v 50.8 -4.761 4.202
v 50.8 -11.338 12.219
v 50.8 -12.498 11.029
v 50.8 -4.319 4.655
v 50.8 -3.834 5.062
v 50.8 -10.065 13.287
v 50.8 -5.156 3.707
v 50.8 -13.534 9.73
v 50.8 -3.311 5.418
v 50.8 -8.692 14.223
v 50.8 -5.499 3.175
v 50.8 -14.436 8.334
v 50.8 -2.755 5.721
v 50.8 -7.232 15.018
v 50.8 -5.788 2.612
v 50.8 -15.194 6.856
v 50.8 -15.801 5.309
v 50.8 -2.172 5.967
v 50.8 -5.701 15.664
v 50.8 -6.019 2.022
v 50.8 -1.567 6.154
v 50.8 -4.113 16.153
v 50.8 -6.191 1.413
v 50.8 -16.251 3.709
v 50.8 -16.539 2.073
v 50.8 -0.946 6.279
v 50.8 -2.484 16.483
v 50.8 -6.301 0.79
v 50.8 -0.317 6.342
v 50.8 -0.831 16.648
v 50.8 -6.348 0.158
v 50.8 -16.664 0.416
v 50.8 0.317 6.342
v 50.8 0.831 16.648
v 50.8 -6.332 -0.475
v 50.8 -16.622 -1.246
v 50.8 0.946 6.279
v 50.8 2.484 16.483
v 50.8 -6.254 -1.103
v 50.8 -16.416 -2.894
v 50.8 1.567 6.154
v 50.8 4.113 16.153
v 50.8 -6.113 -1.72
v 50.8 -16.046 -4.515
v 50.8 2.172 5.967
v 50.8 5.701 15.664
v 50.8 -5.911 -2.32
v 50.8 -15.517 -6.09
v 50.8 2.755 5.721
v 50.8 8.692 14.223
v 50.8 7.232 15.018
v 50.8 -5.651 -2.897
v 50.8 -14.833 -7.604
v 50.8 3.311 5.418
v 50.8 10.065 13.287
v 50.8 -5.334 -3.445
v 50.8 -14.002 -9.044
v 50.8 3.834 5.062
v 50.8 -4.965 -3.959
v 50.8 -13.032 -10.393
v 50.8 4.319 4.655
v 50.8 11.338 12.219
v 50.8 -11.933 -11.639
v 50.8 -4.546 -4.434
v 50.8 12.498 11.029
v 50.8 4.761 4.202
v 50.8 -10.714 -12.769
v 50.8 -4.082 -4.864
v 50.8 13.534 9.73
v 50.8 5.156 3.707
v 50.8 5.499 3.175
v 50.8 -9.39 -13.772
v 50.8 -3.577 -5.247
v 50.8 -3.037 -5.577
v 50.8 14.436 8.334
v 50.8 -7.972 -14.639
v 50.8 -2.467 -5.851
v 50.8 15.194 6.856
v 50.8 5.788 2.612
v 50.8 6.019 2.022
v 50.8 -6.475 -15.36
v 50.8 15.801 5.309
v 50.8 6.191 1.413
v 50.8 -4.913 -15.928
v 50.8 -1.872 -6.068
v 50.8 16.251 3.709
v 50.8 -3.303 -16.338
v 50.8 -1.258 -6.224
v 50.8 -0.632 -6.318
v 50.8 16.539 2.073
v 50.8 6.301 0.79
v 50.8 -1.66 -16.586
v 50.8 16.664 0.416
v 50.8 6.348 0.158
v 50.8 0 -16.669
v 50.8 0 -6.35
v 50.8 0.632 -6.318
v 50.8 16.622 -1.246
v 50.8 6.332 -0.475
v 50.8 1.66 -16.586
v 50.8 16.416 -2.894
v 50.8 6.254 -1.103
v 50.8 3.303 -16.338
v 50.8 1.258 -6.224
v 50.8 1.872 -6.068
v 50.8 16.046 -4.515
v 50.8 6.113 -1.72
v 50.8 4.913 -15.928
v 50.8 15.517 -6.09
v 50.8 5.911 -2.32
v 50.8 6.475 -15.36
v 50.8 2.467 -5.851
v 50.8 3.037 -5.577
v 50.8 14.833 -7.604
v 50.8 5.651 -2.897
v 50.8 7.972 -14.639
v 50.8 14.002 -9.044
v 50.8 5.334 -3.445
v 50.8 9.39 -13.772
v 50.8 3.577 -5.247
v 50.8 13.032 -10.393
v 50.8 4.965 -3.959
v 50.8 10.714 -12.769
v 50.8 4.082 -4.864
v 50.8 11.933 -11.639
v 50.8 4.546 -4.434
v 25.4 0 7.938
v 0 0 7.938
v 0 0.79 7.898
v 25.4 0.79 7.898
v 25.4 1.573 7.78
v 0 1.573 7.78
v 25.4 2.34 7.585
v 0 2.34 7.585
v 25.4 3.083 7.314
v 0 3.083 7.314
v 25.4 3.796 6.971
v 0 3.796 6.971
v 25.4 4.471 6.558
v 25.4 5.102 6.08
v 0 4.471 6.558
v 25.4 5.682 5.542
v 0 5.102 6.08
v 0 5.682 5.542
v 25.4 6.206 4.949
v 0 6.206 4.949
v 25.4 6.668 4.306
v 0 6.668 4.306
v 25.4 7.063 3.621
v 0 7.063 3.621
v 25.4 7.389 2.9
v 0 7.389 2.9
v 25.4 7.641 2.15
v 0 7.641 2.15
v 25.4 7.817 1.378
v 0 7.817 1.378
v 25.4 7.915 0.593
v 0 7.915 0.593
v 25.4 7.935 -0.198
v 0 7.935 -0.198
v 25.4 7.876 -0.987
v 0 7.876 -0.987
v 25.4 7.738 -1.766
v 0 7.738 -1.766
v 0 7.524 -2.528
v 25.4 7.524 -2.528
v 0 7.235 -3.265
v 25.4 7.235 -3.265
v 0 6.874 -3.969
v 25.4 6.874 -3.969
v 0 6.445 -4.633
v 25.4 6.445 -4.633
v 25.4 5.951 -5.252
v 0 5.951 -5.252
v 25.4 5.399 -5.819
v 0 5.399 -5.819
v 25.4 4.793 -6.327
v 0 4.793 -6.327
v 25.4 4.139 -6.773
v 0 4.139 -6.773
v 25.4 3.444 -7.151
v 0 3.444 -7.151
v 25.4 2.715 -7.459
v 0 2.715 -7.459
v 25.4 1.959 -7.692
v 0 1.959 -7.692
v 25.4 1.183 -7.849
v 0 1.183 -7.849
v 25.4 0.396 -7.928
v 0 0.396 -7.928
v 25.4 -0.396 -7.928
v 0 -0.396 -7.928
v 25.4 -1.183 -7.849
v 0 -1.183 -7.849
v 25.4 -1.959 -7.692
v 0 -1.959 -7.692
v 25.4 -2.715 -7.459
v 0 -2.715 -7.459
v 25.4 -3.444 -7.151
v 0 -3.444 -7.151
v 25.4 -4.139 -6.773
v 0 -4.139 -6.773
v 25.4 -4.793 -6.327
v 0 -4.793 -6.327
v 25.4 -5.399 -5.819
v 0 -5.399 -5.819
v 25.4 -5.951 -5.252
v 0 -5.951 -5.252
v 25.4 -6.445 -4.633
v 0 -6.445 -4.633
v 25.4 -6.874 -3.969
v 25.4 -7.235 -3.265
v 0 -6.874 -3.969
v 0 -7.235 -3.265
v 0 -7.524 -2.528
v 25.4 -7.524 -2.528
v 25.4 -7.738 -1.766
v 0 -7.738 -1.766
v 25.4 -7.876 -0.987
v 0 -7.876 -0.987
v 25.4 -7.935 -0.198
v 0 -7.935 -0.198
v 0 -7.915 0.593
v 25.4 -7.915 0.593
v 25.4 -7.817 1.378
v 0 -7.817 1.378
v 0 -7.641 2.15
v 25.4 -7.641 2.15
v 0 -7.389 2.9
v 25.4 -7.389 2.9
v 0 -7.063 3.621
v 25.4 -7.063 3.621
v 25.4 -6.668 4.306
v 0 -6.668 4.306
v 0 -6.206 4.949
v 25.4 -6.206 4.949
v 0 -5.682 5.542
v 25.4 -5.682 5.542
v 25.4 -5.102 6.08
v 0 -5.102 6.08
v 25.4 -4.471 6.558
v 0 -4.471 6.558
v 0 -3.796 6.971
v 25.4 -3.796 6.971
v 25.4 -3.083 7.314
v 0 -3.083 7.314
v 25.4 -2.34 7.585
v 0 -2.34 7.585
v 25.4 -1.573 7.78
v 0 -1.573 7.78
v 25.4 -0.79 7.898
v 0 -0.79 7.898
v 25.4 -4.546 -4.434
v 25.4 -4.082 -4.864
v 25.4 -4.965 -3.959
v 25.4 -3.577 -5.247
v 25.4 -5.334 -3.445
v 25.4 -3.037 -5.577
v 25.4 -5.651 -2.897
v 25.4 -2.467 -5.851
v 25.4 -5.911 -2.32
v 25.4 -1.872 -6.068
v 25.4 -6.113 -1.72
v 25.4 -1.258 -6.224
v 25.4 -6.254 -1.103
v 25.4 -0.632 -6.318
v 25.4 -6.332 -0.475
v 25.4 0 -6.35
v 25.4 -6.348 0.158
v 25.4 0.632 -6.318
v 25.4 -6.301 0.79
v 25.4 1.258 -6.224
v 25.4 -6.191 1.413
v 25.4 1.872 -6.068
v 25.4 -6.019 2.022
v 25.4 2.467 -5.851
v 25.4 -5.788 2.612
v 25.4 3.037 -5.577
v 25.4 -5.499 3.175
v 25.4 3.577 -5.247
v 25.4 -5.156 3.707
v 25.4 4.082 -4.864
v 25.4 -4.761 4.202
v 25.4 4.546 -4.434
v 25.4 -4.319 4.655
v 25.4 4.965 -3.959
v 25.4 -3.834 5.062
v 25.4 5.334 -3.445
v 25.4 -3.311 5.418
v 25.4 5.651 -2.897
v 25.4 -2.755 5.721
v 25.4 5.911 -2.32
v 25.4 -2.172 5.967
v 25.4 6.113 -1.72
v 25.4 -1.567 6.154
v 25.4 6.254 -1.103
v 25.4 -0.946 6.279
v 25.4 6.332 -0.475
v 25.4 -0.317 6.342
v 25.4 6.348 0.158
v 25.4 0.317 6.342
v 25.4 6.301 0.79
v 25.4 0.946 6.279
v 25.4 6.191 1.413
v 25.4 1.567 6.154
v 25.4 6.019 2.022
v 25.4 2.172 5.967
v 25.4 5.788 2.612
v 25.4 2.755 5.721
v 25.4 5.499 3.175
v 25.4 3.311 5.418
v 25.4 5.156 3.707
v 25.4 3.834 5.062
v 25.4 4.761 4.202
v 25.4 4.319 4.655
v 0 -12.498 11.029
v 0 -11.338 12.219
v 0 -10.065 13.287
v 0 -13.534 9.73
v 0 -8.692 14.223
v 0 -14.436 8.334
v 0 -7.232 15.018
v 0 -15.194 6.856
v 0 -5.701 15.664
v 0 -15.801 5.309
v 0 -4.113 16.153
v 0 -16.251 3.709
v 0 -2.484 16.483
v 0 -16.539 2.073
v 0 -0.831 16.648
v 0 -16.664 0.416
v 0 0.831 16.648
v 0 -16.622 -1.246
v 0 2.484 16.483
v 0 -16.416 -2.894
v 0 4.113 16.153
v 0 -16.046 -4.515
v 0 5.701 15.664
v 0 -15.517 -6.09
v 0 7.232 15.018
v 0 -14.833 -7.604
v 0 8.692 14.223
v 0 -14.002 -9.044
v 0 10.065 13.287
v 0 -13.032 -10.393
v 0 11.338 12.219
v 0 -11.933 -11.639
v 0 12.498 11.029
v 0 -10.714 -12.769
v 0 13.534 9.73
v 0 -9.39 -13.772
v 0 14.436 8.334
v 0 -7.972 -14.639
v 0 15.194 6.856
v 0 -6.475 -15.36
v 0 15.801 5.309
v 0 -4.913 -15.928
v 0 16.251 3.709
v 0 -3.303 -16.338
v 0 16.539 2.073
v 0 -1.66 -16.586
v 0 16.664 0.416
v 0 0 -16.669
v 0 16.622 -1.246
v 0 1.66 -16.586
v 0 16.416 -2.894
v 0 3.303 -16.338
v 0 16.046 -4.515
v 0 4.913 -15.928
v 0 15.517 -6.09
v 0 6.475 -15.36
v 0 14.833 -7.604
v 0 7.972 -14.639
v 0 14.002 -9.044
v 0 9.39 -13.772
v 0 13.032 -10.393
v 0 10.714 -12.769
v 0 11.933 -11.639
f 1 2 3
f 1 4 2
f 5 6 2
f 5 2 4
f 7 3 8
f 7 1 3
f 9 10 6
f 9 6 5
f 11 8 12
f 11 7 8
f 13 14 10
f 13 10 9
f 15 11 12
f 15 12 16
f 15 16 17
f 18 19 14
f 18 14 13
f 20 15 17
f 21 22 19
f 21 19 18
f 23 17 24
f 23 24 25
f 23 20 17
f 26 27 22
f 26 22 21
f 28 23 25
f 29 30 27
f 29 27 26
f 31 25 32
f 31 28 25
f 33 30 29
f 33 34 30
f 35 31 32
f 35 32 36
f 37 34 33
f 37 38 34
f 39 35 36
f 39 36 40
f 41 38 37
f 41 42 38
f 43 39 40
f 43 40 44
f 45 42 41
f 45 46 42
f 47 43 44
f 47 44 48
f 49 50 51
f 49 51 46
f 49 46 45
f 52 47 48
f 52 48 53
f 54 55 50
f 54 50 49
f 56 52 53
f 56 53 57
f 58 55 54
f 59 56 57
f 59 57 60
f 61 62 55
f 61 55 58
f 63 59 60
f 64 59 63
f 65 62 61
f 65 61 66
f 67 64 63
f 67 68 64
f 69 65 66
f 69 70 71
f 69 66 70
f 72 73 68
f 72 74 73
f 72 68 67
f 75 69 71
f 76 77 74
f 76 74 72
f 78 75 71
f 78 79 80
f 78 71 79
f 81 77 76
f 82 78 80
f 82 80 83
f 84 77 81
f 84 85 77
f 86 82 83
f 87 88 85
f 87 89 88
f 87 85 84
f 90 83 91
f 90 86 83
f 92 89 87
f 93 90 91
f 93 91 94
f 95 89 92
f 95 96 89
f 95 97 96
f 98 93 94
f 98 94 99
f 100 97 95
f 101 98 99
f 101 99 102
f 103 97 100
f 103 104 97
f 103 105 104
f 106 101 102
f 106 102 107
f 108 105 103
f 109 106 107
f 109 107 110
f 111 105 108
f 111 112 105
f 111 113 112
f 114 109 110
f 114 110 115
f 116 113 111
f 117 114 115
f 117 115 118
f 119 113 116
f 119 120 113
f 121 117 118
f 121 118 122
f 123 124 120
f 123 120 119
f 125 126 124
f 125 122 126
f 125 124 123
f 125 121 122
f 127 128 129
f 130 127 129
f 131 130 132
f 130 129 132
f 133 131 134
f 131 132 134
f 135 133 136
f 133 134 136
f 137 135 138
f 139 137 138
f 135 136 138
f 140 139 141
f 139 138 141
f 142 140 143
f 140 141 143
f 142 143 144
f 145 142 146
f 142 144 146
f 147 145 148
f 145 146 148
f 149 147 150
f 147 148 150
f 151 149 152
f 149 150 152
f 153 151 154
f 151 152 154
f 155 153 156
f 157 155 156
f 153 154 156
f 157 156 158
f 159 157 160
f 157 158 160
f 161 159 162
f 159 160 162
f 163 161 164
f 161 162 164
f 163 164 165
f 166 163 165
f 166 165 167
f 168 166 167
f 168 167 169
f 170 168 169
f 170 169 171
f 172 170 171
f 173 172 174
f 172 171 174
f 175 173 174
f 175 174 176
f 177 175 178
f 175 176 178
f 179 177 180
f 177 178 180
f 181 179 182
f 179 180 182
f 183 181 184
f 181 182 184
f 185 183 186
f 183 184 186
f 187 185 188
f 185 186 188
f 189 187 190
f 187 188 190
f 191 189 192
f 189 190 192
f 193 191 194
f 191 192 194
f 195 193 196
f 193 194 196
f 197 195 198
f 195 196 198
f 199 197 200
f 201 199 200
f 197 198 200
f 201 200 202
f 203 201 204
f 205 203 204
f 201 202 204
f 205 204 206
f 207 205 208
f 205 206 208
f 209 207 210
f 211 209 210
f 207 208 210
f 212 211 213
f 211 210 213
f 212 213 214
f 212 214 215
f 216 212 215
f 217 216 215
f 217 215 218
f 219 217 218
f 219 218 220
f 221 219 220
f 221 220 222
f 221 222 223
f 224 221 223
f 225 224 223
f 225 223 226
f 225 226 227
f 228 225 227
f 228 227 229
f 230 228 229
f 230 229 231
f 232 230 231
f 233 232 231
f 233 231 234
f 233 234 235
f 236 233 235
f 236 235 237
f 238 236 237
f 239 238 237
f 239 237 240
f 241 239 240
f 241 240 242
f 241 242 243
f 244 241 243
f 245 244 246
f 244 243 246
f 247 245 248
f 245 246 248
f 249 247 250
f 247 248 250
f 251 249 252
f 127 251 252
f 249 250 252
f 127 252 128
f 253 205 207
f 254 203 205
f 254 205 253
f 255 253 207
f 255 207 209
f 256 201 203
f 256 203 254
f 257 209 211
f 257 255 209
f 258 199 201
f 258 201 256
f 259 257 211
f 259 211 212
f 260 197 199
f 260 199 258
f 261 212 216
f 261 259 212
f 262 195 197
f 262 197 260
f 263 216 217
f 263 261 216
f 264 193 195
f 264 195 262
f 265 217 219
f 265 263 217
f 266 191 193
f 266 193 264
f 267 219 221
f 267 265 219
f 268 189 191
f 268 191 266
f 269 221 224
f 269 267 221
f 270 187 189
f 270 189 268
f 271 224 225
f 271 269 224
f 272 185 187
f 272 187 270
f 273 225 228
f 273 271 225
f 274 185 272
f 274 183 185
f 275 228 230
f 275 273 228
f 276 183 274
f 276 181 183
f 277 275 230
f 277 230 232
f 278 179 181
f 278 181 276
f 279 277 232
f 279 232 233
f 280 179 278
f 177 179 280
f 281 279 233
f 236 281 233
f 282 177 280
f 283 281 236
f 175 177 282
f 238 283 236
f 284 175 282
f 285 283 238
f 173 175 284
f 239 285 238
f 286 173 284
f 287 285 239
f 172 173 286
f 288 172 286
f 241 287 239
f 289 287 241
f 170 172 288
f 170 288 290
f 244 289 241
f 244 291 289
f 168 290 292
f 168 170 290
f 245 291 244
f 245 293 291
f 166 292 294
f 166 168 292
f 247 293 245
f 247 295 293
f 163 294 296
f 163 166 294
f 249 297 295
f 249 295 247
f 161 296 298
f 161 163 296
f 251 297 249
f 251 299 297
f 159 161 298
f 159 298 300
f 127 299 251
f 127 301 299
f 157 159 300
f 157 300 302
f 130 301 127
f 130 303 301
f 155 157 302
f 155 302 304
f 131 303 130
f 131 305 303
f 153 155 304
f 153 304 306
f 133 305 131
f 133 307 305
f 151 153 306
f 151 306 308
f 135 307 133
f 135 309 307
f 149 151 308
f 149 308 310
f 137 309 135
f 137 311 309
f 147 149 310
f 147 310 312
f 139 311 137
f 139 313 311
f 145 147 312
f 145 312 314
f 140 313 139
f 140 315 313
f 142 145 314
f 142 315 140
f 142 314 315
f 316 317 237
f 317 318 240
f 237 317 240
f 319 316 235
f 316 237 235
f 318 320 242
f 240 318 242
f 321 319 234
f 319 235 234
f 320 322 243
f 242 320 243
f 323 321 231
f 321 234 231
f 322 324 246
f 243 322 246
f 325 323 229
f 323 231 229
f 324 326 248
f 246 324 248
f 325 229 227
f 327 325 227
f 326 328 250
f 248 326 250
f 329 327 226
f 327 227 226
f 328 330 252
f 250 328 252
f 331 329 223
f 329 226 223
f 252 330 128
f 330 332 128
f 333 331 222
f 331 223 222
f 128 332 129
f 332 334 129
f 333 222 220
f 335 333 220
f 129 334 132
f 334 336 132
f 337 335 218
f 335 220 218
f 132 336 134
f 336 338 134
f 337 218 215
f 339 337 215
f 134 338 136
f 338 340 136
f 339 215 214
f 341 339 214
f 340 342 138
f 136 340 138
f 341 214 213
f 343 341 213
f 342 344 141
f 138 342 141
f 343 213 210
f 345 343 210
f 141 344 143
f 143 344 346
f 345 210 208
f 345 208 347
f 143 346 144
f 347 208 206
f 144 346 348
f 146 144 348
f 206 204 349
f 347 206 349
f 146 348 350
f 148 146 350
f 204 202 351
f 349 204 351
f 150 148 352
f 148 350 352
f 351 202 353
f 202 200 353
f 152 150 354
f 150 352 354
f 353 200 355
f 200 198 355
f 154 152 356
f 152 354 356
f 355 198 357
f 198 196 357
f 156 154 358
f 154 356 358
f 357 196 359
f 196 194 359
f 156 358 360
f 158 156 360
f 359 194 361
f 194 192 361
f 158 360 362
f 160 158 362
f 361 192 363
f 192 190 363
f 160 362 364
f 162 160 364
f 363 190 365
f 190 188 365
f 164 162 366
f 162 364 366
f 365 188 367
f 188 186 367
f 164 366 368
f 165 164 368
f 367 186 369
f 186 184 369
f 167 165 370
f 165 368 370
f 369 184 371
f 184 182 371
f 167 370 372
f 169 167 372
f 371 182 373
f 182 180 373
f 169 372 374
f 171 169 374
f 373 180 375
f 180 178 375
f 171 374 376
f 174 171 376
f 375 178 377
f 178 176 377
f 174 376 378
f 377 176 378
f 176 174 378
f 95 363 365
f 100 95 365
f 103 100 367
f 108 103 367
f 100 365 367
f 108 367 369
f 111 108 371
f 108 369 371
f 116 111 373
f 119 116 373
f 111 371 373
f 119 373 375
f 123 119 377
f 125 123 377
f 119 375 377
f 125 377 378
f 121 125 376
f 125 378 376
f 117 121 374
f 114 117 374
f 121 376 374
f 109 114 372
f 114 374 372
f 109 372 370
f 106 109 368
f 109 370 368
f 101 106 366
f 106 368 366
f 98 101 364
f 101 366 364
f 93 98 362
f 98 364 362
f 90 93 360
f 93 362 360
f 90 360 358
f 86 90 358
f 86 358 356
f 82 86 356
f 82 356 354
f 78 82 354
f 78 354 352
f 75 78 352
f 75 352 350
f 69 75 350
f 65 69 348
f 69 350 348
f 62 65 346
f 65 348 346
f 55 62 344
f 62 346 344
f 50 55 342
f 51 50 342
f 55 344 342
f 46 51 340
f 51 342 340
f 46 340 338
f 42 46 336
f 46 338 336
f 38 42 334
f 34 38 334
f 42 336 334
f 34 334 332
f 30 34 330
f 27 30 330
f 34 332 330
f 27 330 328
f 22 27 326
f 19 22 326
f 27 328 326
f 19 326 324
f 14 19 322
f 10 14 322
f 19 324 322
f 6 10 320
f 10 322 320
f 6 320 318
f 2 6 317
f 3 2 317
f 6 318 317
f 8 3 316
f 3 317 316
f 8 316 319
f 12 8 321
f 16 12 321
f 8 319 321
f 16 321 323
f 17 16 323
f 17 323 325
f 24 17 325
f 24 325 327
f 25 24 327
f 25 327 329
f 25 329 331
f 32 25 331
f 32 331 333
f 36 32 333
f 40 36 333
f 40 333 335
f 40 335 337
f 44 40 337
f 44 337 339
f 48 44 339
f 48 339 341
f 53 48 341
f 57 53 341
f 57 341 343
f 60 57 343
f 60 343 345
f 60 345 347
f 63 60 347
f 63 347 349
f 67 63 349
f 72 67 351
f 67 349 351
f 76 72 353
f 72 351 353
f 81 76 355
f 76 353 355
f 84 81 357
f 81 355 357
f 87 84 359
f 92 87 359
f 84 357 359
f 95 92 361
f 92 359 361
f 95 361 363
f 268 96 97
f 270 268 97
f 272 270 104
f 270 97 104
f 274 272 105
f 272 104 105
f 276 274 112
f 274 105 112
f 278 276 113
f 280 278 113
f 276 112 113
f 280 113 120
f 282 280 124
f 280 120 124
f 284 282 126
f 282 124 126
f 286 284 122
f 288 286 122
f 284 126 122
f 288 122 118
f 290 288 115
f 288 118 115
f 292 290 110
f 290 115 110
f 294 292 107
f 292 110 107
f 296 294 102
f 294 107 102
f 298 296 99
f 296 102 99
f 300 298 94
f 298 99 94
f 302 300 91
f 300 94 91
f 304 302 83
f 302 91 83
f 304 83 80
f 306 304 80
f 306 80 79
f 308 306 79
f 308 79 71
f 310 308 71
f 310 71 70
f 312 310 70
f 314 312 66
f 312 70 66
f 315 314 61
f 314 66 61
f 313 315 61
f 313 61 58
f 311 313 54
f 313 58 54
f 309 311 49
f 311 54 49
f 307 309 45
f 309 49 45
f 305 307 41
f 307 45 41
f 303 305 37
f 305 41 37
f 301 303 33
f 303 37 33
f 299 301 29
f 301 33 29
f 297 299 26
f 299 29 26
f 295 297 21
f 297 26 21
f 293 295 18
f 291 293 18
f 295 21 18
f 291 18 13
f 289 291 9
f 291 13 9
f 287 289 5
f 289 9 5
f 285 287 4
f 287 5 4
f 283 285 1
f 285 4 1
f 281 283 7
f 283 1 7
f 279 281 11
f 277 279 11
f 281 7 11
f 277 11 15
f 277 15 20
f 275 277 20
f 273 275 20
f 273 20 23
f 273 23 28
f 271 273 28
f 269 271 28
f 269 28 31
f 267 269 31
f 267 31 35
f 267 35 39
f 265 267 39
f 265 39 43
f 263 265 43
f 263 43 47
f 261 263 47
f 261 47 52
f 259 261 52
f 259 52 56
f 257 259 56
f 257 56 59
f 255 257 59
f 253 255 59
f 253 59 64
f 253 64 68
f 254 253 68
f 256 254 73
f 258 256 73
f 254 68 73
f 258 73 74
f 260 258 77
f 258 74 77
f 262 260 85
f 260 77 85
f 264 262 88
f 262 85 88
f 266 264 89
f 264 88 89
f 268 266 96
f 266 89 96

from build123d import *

# Parameters (mm, degrees)
SKETCH1_R          = 16.66875
EXTRUDE1_DEPTH     = 50.8
SKETCH2_R          = 6.35
CUT_EXTRUDE1_DEPTH = 25.4
SKETCH3_R          = 7.9375
CUT_EXTRUDE2_DEPTH = 25.4


with BuildPart() as part:
    # Sketch1 → Extrude1 (new body)
    with BuildSketch(Plane(origin=(0, 0, 0), x_dir=(0, 0, -1), z_dir=(1, 0, 0))):
        Circle(SKETCH1_R)
    extrude(amount=EXTRUDE1_DEPTH)

    # Sketch2 → Cut-Extrude1 (cut)
    with BuildSketch(Plane(origin=(50.8, 0, 0), x_dir=(0, 0, -1), z_dir=(1, 0, 0))):
        Circle(SKETCH2_R)
    extrude(amount=-CUT_EXTRUDE1_DEPTH, mode=Mode.SUBTRACT)

    # Sketch3 → Cut-Extrude2 (cut)
    with BuildSketch(Plane.ZY):
        Circle(SKETCH3_R)
    extrude(amount=-CUT_EXTRUDE2_DEPTH, mode=Mode.SUBTRACT)


solid = part.part
